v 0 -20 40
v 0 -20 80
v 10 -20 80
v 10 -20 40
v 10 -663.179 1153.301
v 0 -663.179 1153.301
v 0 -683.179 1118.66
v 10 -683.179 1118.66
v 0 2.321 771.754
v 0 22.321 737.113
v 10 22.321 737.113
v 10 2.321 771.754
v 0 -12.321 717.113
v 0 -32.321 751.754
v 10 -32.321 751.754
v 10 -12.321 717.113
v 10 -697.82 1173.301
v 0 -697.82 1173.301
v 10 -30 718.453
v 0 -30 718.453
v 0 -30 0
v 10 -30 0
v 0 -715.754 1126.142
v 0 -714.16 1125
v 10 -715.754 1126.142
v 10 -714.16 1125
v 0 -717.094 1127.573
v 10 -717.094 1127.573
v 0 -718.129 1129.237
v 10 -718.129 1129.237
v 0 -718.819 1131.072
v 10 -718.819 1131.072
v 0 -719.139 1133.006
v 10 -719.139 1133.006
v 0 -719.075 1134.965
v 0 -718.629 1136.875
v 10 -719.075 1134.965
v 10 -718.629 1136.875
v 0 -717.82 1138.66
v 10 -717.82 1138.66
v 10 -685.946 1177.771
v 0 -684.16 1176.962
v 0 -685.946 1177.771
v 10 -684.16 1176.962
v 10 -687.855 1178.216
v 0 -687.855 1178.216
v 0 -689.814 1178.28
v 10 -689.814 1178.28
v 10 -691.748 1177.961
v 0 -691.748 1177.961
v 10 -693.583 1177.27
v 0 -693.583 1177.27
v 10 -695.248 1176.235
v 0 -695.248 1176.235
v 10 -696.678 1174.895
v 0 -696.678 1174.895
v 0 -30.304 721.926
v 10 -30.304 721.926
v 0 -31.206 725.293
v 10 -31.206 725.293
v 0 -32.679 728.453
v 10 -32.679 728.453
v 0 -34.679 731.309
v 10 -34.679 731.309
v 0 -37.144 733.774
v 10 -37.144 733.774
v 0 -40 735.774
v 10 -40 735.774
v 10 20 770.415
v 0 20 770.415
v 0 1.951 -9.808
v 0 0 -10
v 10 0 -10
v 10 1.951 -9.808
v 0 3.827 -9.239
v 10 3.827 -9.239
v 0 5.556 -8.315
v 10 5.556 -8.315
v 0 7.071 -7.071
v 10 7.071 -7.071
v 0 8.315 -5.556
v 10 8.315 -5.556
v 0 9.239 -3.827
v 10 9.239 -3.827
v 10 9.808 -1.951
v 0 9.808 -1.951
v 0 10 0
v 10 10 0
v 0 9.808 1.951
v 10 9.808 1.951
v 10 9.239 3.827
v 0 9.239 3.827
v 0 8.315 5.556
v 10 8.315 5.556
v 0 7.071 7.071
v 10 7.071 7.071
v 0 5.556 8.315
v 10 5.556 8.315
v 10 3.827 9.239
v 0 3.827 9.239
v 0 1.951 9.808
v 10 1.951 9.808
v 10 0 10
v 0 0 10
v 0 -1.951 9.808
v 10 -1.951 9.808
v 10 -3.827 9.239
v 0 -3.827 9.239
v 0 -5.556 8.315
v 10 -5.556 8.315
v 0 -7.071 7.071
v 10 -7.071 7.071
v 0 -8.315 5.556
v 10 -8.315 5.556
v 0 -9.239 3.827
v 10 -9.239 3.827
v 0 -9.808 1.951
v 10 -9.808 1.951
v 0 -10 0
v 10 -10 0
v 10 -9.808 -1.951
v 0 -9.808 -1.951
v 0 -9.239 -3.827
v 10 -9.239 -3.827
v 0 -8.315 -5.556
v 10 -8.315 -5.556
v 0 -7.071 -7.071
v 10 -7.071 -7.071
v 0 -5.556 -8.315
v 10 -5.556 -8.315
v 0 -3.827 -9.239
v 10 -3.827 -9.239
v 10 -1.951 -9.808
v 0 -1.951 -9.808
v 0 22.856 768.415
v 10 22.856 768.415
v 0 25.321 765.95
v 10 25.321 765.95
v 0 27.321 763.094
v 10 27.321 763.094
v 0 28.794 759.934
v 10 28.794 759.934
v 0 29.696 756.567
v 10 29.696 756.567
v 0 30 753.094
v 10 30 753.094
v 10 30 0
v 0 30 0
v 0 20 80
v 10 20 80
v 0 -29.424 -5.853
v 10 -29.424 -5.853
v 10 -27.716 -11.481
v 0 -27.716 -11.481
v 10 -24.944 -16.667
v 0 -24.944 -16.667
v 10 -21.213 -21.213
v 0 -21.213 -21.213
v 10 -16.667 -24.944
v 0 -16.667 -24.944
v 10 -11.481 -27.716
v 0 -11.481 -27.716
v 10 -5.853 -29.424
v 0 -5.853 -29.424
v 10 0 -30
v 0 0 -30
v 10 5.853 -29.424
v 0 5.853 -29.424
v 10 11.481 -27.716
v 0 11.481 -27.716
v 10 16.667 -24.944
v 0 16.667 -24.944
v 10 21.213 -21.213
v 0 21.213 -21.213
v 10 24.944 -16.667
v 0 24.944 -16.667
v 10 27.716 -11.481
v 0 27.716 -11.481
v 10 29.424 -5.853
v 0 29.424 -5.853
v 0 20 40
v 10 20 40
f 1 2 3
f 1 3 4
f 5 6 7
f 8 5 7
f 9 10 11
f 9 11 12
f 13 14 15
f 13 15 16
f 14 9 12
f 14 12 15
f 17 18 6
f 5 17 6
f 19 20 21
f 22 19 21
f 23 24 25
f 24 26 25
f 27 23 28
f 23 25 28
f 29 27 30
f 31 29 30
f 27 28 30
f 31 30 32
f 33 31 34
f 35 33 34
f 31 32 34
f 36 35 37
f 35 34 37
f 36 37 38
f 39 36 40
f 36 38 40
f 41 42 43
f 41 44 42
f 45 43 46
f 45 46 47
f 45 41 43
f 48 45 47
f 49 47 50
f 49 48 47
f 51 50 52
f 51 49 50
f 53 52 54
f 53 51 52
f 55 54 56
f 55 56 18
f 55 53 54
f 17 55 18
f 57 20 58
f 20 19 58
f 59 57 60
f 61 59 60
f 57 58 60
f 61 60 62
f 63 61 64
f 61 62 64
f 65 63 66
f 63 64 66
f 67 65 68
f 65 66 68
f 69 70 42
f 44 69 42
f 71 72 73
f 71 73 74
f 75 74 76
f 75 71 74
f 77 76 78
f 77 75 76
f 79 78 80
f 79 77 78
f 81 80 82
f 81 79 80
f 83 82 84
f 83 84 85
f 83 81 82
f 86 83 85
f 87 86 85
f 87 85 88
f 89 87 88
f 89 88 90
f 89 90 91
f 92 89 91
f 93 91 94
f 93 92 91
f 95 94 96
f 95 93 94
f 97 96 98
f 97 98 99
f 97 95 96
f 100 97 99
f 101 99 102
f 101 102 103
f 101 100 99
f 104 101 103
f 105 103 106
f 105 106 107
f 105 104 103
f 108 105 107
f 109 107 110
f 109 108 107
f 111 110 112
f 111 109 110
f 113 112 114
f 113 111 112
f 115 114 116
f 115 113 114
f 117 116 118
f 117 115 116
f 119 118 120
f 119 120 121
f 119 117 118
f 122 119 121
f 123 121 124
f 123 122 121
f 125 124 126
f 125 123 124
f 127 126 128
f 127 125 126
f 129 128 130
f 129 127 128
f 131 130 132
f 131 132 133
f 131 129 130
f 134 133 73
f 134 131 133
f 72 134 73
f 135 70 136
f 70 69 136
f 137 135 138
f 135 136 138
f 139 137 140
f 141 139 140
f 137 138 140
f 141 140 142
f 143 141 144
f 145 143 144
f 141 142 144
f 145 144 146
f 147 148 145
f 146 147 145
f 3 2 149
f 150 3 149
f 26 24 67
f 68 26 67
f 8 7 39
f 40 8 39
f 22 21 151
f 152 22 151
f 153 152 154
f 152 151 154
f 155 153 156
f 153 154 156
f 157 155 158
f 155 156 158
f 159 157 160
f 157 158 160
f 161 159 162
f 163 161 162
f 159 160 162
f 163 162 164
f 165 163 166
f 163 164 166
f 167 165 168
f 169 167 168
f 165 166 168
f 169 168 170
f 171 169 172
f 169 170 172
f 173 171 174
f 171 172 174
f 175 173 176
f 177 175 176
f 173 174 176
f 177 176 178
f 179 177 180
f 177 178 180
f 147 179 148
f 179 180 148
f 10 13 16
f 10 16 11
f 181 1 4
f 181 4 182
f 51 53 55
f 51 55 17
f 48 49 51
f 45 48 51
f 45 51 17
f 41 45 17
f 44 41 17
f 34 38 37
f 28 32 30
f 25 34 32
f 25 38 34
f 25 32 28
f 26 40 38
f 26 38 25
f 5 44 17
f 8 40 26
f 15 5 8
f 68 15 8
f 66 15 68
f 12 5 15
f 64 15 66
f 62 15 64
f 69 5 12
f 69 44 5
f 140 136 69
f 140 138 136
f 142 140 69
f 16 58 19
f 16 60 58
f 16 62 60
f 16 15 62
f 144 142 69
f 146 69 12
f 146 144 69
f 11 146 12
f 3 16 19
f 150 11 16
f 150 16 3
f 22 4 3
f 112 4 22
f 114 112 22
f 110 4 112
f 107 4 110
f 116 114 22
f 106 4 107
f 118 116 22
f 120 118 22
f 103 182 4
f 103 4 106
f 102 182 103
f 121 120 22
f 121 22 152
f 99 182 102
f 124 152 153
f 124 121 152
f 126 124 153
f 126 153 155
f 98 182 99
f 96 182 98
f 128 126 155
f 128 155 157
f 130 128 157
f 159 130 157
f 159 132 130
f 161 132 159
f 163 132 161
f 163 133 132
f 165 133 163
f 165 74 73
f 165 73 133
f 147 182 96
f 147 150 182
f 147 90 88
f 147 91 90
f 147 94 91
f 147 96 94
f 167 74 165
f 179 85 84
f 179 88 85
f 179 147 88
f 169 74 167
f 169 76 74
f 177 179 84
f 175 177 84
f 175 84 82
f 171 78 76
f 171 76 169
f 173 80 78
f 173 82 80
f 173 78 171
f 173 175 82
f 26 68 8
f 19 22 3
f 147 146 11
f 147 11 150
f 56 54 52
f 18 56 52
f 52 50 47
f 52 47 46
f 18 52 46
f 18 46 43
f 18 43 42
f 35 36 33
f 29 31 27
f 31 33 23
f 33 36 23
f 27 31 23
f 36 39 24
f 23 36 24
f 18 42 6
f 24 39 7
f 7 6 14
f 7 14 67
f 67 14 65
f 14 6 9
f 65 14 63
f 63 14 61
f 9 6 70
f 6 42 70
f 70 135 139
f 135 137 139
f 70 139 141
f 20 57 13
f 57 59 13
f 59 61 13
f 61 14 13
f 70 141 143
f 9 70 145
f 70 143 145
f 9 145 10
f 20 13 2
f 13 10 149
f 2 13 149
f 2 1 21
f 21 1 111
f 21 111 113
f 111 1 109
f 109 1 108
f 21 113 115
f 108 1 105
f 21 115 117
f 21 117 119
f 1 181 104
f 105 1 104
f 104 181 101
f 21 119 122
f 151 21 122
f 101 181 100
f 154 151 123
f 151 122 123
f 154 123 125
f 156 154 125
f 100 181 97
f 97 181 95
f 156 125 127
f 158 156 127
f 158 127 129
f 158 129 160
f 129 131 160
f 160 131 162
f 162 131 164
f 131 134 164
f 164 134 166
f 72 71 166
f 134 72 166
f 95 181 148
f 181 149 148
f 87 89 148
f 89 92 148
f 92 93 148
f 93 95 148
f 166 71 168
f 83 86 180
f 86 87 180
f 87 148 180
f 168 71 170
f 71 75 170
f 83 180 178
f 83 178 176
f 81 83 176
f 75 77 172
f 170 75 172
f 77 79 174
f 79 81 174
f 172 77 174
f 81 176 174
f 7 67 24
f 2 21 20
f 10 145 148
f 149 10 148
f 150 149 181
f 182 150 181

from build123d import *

# Parameters (mm, degrees)
ESQUISSE1_R        = 10
ESQUISSE1_W        = 40
ESQUISSE1_H        = 40
BOSS_EXTRU_1_DEPTH = 10
CONG_1_R           = 10
CONG_2_R           = 20


with BuildPart() as part:
    # Esquisse1 → Boss.-Extru.1 (new body)
    with BuildSketch(Plane(origin=(0, 0, 0), x_dir=(0, 0, -1), z_dir=(1, 0, 0))):
        with BuildLine():
            Line((0, 30), (-764.641016151, 30))
            Line((-764.641016151, 30), (-1181.961524227, -692.820323028))
            Line((-1181.961524227, -692.820323028), (-1173.301270189, -697.820323028))
            Line((-1173.301270189, -697.820323028), (-1153.301270189, -663.179306876))
            Line((-1153.301270189, -663.179306876), (-1118.660254038, -683.179306876))
            Line((-1118.660254038, -683.179306876), (-1138.660254038, -717.820323028))
            Line((-1138.660254038, -717.820323028), (-1130, -722.820323028))
            Line((-1130, -722.820323028), (-730, -30))
            Line((-730, -30), (0, -30))
            ThreePointArc((0, -30), (30, 0), (0, 30))
        make_face()
        Circle(ESQUISSE1_R, mode=Mode.SUBTRACT)
        with Locations((-60, 0)):
            Rectangle(ESQUISSE1_W, ESQUISSE1_H, mode=Mode.SUBTRACT)
        Polygon((-737.113248654, 22.320508076), (-771.754264805, 2.320508076), (-751.754264805, -32.320508076), (-717.113248654, -12.320508076), align=None, mode=Mode.SUBTRACT)
    extrude(amount=BOSS_EXTRU_1_DEPTH)

    # Congé1
    cong_1_edges = [part.edges().sort_by_distance(p)[0] for p in [
        (5, -692.820323028, 1181.961524227),
        (5, -722.820323028, 1130),
    ]]
    fillet(cong_1_edges, radius=CONG_1_R - 0.0001)  # a hair under: the kernel refuses the full size

    # Congé2
    cong_2_edges = [part.edges().sort_by_distance(p)[0] for p in [
        (5, -30, 730),
        (5, 30, 764.641016151),
    ]]
    fillet(cong_2_edges, radius=CONG_2_R)


solid = part.part
